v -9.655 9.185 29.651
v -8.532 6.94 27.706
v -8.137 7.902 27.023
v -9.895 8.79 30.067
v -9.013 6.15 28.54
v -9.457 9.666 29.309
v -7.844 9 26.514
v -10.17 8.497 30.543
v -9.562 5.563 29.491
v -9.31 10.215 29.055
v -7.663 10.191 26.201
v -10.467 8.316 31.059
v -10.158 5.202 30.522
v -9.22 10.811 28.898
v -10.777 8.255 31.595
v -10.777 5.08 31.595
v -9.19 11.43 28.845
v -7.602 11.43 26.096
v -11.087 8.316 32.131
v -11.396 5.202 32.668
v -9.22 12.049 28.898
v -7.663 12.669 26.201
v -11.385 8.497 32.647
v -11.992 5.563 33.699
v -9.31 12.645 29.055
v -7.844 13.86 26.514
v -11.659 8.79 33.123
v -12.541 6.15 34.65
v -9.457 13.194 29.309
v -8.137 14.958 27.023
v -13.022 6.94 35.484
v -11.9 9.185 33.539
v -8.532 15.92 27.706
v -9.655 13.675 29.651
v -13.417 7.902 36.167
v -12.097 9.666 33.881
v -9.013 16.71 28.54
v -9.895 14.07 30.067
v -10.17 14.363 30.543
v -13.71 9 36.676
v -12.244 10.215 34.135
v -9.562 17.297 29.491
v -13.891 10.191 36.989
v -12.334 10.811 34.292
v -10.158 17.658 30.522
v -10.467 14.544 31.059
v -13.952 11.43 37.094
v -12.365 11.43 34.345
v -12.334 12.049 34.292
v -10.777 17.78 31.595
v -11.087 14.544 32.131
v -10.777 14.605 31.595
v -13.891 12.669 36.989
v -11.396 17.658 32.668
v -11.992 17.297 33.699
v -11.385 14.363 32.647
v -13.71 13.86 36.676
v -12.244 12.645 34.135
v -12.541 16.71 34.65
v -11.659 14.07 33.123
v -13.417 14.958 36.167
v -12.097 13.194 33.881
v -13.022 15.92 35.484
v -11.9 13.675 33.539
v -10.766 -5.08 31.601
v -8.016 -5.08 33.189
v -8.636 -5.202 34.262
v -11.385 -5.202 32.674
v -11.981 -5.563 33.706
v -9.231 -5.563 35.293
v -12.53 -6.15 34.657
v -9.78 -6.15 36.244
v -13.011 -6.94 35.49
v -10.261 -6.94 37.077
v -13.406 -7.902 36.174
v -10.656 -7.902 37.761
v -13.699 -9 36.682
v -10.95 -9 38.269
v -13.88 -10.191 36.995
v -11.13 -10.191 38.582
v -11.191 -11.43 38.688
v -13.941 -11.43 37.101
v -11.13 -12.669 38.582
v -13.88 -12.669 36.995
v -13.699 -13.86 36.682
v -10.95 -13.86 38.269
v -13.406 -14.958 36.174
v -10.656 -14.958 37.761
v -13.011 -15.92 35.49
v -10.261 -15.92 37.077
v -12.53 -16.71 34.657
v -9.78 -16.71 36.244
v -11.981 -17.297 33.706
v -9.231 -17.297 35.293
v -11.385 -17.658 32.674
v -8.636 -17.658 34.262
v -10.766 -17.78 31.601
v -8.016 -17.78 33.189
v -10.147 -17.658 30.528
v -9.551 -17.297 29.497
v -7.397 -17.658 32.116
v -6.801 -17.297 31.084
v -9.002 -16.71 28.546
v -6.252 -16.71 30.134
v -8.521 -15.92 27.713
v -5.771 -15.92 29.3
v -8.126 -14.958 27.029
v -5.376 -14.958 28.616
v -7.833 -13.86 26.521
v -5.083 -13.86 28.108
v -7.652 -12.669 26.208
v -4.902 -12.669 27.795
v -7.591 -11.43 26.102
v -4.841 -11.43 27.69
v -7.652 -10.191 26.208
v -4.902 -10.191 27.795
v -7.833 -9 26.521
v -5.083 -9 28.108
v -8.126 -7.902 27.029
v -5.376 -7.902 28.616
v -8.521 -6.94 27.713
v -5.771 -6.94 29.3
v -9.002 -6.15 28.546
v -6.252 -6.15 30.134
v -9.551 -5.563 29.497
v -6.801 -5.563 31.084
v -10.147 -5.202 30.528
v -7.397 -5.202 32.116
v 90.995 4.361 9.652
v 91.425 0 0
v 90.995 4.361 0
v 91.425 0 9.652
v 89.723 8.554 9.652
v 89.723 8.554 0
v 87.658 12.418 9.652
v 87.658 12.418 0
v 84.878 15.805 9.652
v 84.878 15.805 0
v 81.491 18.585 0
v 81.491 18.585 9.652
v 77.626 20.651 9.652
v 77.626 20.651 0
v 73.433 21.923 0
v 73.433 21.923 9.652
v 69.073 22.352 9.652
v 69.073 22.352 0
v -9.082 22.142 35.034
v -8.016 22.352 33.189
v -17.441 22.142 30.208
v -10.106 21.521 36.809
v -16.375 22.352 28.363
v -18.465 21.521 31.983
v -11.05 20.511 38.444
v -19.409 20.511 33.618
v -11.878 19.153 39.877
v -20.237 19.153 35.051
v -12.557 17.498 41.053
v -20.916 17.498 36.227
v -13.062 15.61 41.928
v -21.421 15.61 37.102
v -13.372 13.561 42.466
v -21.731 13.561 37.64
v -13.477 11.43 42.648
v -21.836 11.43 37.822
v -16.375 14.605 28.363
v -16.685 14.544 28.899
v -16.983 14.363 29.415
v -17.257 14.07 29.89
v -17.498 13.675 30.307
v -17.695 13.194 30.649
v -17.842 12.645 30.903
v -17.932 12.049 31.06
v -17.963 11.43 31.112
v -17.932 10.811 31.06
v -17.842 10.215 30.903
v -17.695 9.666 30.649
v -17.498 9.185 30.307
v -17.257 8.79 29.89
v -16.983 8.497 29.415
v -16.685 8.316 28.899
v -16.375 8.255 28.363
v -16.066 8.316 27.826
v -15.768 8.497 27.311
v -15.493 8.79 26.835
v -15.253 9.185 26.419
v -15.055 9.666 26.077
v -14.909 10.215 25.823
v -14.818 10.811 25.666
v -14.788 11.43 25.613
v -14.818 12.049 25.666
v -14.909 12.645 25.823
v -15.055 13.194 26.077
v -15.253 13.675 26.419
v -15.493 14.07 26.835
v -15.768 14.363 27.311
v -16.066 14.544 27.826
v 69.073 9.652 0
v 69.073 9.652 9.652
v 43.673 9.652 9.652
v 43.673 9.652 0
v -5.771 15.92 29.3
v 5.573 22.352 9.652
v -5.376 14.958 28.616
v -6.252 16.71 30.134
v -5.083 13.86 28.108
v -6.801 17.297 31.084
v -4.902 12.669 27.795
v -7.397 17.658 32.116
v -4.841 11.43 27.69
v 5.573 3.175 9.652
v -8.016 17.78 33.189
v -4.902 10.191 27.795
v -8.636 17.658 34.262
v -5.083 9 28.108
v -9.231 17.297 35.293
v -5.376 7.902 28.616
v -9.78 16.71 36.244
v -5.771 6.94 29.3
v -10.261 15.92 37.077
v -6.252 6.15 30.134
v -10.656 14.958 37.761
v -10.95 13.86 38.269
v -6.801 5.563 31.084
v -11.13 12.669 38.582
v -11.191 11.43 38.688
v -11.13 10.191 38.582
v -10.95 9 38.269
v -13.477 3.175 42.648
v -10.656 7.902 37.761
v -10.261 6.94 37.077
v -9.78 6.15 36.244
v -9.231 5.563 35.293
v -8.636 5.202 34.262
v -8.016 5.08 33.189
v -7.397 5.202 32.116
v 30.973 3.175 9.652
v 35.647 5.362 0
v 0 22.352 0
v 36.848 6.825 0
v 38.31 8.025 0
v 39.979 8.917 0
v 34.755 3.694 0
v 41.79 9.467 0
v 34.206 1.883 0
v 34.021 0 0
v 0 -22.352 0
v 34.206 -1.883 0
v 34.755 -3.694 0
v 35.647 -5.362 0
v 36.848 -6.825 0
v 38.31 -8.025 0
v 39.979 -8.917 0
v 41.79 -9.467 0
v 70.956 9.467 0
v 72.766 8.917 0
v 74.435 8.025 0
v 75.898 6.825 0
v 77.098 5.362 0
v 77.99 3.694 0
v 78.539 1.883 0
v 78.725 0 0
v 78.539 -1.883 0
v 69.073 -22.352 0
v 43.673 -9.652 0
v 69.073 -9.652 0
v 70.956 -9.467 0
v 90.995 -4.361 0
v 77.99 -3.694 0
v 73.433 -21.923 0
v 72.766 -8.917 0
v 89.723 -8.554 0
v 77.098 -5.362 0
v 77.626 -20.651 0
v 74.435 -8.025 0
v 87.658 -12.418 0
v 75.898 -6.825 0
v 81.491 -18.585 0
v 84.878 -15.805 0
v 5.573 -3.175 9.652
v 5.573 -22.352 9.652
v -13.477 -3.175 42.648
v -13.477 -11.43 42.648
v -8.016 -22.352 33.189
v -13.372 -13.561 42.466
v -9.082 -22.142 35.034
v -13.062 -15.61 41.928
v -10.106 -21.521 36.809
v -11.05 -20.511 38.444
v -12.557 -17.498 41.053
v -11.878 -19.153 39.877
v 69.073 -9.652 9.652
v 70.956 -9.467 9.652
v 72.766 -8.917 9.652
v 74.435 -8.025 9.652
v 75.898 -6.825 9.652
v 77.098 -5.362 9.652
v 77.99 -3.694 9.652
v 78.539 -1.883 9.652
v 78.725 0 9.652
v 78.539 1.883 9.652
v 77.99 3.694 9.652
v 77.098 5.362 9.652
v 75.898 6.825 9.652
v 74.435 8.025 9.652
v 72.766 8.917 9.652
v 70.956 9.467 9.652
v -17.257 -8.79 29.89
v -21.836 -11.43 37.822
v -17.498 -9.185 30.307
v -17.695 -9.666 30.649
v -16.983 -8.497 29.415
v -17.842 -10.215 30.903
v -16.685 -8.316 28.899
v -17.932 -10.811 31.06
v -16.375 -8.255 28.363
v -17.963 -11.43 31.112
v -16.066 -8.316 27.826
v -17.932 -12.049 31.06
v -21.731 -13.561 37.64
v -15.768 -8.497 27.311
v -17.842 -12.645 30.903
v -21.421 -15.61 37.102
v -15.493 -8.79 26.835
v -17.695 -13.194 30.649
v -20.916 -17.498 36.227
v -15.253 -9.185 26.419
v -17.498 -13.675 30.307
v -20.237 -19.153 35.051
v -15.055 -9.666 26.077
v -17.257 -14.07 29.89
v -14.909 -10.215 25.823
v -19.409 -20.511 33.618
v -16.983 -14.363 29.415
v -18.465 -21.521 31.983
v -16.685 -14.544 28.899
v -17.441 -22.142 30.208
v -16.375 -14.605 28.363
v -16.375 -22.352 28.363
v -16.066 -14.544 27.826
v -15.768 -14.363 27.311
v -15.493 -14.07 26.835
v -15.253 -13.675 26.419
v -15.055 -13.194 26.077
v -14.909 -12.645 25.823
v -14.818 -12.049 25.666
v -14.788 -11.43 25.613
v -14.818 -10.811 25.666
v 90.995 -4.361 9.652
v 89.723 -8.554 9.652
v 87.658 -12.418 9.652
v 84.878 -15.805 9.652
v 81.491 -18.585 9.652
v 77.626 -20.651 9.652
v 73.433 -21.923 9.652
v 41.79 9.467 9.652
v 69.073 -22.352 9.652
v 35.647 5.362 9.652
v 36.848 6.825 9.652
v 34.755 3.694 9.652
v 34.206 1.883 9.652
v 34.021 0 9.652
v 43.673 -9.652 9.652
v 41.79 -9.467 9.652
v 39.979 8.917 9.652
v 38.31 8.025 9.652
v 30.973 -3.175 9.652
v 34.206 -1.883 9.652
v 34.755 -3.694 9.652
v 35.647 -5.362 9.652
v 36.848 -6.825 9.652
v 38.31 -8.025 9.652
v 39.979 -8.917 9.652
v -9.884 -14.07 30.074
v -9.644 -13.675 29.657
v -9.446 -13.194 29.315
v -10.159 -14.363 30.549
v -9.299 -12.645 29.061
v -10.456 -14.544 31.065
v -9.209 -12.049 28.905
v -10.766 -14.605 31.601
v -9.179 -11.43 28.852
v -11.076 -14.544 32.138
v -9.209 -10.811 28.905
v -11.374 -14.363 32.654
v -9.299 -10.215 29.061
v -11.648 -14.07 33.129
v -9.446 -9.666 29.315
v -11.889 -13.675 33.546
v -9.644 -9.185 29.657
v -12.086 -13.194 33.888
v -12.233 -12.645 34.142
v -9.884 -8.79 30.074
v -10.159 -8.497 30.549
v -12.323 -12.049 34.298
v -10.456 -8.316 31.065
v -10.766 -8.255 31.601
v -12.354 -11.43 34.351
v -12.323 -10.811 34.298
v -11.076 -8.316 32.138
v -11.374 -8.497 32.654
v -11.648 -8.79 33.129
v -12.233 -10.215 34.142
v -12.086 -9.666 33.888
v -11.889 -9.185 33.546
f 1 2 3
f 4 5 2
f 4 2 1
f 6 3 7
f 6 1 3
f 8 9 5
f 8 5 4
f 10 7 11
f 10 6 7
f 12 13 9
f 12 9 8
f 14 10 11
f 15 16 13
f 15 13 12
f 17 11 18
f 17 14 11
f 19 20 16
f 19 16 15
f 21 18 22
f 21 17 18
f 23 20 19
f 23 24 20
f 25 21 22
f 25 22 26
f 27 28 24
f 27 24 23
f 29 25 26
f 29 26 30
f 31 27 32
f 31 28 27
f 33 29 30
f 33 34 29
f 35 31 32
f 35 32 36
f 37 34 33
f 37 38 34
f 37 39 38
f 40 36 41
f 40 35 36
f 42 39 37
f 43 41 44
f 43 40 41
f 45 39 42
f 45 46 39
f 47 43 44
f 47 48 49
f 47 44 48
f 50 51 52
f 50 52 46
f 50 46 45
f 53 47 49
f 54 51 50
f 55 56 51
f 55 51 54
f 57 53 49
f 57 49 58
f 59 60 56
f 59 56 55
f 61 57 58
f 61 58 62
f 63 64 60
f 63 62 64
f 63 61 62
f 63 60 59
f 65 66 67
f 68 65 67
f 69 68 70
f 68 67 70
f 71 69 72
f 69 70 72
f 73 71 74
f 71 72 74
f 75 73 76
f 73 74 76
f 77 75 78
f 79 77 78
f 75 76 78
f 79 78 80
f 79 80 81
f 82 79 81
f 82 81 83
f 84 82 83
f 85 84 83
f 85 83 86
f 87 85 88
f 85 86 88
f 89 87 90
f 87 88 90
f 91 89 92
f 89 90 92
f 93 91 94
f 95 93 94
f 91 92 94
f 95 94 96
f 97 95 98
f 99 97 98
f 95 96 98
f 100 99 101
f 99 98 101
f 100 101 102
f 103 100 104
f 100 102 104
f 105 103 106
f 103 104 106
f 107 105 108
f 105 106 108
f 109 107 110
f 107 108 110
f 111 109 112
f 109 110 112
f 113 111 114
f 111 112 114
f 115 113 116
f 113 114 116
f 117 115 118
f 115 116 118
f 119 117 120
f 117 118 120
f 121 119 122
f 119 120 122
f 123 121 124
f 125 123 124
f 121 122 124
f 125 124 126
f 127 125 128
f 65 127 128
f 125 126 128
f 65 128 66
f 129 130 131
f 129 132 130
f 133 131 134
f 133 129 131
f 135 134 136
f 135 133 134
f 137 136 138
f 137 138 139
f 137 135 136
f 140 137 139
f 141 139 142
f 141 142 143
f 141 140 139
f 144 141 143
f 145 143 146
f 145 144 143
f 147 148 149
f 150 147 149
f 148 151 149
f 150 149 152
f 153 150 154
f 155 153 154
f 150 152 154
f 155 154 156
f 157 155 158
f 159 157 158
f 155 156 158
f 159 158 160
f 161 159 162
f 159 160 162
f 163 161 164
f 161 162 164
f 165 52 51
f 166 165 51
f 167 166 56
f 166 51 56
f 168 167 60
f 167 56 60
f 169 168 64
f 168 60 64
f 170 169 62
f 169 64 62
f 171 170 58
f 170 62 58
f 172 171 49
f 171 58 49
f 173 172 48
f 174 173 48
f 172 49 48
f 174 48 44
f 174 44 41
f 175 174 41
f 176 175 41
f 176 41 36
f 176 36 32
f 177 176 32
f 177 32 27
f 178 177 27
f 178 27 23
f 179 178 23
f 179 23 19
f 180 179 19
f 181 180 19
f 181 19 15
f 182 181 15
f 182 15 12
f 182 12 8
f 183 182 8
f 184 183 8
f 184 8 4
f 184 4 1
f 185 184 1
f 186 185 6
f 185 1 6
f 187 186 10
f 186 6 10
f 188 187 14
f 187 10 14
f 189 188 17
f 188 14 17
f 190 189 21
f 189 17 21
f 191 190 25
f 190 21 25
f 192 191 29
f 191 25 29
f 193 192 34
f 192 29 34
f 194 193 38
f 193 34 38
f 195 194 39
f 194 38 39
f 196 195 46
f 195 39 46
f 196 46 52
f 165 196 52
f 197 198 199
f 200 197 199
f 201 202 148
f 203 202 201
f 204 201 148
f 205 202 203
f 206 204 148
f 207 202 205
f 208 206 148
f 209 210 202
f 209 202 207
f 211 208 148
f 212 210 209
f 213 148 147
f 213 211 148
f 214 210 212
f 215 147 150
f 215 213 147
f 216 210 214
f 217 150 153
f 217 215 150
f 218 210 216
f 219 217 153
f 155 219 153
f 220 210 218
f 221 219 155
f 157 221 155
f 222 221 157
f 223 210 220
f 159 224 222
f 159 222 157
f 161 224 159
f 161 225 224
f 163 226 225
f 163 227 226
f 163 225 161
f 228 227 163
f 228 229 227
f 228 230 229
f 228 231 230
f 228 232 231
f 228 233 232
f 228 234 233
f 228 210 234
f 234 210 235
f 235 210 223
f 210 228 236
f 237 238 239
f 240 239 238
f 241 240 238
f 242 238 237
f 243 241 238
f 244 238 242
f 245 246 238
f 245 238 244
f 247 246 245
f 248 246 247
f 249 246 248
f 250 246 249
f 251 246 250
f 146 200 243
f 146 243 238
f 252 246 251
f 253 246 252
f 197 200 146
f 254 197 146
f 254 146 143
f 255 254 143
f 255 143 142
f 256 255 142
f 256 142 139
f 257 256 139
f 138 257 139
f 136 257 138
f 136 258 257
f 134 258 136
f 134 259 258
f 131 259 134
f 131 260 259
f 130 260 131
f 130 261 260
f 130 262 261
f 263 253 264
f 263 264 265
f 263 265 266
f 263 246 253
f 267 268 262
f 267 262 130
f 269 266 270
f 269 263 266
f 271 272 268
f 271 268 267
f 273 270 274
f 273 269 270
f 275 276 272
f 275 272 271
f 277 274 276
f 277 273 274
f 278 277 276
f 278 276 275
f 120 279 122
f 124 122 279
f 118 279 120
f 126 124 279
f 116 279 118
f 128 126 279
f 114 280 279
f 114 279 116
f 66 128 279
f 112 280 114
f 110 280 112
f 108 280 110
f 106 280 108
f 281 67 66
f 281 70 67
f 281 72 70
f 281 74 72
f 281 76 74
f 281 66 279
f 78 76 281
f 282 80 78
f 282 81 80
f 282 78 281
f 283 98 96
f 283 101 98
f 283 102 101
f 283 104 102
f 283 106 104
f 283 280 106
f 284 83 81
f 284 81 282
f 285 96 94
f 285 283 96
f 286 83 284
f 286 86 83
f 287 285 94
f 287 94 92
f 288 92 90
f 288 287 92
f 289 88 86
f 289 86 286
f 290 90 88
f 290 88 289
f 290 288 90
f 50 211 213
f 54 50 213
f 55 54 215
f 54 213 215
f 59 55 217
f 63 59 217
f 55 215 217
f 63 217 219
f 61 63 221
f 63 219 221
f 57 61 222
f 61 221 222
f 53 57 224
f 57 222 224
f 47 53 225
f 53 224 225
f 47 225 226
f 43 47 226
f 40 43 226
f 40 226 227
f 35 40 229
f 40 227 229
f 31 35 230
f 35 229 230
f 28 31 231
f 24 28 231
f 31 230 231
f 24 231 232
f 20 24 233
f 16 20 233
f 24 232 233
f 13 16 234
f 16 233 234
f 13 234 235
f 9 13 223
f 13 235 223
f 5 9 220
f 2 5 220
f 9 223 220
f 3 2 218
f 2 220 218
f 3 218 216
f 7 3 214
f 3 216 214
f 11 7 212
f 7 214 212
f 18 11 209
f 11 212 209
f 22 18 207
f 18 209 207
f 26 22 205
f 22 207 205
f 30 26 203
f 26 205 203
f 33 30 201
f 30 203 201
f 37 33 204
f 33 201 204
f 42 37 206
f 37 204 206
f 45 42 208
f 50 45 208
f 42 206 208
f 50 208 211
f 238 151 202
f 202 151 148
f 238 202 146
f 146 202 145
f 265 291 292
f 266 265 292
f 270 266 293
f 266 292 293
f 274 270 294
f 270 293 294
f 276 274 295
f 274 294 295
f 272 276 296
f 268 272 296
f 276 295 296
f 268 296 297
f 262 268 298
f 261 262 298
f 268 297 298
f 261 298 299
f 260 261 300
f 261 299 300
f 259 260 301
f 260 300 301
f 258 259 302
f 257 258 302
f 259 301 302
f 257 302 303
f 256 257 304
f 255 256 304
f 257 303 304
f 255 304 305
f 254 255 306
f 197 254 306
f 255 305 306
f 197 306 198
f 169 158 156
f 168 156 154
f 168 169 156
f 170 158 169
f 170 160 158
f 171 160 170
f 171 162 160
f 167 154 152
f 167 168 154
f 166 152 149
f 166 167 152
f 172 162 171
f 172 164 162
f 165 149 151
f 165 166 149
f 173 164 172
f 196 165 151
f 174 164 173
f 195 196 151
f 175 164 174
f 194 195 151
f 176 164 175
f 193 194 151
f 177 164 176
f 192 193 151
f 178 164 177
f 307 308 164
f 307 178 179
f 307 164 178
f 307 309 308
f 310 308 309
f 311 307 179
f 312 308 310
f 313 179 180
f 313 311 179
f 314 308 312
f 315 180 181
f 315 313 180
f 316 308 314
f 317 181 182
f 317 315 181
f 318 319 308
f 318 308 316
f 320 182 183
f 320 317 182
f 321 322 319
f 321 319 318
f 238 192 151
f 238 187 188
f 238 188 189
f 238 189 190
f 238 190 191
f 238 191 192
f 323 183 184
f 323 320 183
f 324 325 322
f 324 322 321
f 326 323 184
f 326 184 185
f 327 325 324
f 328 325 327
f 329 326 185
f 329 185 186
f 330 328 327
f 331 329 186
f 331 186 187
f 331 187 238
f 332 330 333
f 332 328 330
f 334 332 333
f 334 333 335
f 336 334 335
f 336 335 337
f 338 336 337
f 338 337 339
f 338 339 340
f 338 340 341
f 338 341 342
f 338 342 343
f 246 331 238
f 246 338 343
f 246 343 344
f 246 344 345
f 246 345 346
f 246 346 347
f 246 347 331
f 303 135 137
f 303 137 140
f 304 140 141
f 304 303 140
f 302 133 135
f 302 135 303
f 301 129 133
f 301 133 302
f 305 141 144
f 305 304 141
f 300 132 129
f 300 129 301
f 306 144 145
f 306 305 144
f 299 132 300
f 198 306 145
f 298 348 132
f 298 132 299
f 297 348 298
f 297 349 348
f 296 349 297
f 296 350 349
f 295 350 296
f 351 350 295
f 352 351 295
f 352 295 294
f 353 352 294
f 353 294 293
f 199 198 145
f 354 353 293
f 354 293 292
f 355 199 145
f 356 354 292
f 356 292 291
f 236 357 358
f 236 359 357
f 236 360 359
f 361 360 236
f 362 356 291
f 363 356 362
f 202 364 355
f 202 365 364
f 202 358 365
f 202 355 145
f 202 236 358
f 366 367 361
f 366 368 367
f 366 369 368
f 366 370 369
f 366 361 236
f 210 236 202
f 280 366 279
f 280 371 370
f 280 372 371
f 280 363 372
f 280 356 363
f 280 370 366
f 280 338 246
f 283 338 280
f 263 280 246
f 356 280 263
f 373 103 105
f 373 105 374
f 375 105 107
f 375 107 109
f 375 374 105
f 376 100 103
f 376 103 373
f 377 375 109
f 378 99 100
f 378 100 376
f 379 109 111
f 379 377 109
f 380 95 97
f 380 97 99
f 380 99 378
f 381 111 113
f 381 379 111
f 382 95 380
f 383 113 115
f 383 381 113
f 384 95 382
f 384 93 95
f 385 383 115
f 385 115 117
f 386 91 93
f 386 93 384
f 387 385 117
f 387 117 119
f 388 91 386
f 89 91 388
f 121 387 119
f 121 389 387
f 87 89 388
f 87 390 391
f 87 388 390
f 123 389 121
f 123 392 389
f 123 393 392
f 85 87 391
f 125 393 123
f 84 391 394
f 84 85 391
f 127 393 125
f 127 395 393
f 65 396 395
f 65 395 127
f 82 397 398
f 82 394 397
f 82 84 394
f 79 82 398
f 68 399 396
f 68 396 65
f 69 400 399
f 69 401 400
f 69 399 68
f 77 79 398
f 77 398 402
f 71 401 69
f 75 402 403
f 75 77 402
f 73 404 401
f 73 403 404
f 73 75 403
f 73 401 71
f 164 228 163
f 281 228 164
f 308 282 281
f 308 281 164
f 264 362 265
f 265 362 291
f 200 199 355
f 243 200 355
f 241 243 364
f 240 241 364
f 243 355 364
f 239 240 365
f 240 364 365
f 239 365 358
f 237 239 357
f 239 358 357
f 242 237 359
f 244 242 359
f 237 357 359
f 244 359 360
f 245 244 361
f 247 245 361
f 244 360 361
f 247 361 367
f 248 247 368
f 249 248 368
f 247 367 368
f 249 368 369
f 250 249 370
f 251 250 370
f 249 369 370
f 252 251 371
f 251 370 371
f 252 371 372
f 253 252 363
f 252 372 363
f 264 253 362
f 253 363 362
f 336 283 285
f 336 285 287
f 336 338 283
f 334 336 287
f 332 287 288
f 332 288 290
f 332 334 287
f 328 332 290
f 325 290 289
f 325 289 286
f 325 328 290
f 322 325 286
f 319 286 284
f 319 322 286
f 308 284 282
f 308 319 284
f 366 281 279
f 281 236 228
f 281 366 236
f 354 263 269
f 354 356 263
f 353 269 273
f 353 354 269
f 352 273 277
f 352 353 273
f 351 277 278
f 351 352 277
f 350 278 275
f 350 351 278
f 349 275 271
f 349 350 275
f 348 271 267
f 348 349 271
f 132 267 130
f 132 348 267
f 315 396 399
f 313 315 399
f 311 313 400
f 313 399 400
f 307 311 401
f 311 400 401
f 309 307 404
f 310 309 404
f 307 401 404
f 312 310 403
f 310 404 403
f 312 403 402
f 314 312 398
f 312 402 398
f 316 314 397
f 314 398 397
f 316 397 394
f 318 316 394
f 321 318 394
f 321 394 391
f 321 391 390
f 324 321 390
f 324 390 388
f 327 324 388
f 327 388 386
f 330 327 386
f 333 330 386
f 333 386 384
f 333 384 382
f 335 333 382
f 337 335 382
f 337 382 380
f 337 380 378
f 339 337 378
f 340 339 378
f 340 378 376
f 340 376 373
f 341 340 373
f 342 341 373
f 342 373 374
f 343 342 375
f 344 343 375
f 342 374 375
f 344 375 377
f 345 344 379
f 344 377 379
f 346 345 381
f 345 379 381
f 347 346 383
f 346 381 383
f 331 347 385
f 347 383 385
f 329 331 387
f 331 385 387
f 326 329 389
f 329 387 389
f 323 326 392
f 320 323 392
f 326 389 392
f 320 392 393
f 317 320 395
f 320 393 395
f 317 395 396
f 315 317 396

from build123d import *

# Parameters (mm, degrees)
F1_DEPTH      = 22.352
F1_DEPTH_BACK = 22.352
F3_DEPTH      = 3.175
F3_DEPTH_BACK = 3.175
F4_R          = 10.922
F5_R          = 22.35199
F7_DEPTH      = 9.652
F9_R          = 6.35
F9_R_2        = 3.175
F10_DEPTH     = 3.175
F11_DEPTH     = 28.5637839421
F12_R         = 6.35
F12_R_2       = 3.175
F13_DEPTH     = 3.1877
F14_DEPTH     = 28.5637839421


# Not quite as in the source:
# - a fillet or chamfer is up to 0.001 mm smaller than in the source, because OpenCascade refuses the exact size


with BuildPart() as f1:
    # F0 (on Front) → F1 (new body, two sides)
    with BuildSketch(Plane.XZ) as f1_sk:
        Polygon((-21.8362923991, 37.8215678842), (0, 0), (91.4245847982, 0), (91.4245847982, 9.652), (5.5725847982, 9.652), (-13.4774152018, 42.6475678842), align=None)
    extrude(amount=F1_DEPTH)
    extrude(f1_sk.sketch, amount=-F1_DEPTH_BACK)

    # F2 (on Front) → F3 (join, two sides)
    with BuildSketch(Plane.XZ) as f3_sk:
        Polygon((30.9725847982, 9.652), (-13.4774152018, 42.6475678842), (5.5725847982, 9.652), align=None)
    extrude(amount=F3_DEPTH)
    extrude(f3_sk.sketch, amount=-F3_DEPTH_BACK)

    # F4
    f4_edges = [f1.edges().sort_by_distance(p)[0] for p in [
        (-17.656854, -22.352, 40.234568),
        (-17.656854, 22.352, 40.234568),
    ]]
    fillet(f4_edges, radius=F4_R)

    # F5 (radius 22.352 in the source; OpenCascade refuses exactly that, so slightly less here)
    f5_edges = [f1.edges().sort_by_distance(p)[0] for p in [
        (91.424585, -22.352, 4.826),
        (91.424585, 22.352, 4.826),
    ]]
    fillet(f5_edges, radius=F5_R)

    # F6 (on face) → F7 (cut, through all)
    with BuildSketch(Plane.XY.offset(9.652)):
        with BuildLine():
            Line((43.6725847982, -9.652), (69.0725847982, -9.652))
            ThreePointArc((69.0725847982, -9.652), (78.7245847982, 0), (69.0725847982, 9.652))
            Line((69.0725847982, 9.652), (43.6725847982, 9.652))
            ThreePointArc((43.6725847982, 9.652), (34.0205847982, 0), (43.6725847982, -9.652))
        make_face()
    extrude(amount=-F7_DEPTH, mode=Mode.SUBTRACT)

    # F9 (on face) → F10 (cut)
    with BuildSketch(Plane(origin=(8.3588771973, 0, 4.826), x_dir=(0, 1, 0), z_dir=(0.8660254038, 0, 0.5))):
        with Locations((-11.43, 32.7505847982)):
            Circle(F9_R)
        with Locations((-11.43, 32.7505847982)):
            Circle(F9_R_2, mode=Mode.SUBTRACT)
        with Locations((-11.43, 32.7505847982)):
            Circle(F9_R_2)
    extrude(amount=-F10_DEPTH, mode=Mode.SUBTRACT)

    # F9 (on face) → F11 (cut, through all)
    with BuildSketch(Plane(origin=(8.3588771973, 0, 4.826), x_dir=(0, 1, 0), z_dir=(0.8660254038, 0, 0.5))):
        with Locations((-11.43, 32.7505847982)):
            Circle(F9_R_2)
    extrude(amount=-F11_DEPTH, mode=Mode.SUBTRACT)

    # F12 (on face) → F13 (cut)
    with BuildSketch(Plane(origin=(8.3588771973, 0, 4.826), x_dir=(0, 1, 0), z_dir=(0.8660254038, 0, 0.5))):
        with Locations((11.43, 32.7505847982)):
            Circle(F12_R)
        with Locations((11.43, 32.7505847982)):
            Circle(F12_R_2, mode=Mode.SUBTRACT)
        with Locations((11.43, 32.7505847982)):
            Circle(F12_R_2)
    extrude(amount=-F13_DEPTH, mode=Mode.SUBTRACT)

    # F12 (on face) → F14 (cut, through all)
    with BuildSketch(Plane(origin=(8.3588771973, 0, 4.826), x_dir=(0, 1, 0), z_dir=(0.8660254038, 0, 0.5))):
        with Locations((11.43, 32.7505847982)):
            Circle(F12_R_2)
    extrude(amount=-F14_DEPTH, mode=Mode.SUBTRACT)


solid = f1.part
